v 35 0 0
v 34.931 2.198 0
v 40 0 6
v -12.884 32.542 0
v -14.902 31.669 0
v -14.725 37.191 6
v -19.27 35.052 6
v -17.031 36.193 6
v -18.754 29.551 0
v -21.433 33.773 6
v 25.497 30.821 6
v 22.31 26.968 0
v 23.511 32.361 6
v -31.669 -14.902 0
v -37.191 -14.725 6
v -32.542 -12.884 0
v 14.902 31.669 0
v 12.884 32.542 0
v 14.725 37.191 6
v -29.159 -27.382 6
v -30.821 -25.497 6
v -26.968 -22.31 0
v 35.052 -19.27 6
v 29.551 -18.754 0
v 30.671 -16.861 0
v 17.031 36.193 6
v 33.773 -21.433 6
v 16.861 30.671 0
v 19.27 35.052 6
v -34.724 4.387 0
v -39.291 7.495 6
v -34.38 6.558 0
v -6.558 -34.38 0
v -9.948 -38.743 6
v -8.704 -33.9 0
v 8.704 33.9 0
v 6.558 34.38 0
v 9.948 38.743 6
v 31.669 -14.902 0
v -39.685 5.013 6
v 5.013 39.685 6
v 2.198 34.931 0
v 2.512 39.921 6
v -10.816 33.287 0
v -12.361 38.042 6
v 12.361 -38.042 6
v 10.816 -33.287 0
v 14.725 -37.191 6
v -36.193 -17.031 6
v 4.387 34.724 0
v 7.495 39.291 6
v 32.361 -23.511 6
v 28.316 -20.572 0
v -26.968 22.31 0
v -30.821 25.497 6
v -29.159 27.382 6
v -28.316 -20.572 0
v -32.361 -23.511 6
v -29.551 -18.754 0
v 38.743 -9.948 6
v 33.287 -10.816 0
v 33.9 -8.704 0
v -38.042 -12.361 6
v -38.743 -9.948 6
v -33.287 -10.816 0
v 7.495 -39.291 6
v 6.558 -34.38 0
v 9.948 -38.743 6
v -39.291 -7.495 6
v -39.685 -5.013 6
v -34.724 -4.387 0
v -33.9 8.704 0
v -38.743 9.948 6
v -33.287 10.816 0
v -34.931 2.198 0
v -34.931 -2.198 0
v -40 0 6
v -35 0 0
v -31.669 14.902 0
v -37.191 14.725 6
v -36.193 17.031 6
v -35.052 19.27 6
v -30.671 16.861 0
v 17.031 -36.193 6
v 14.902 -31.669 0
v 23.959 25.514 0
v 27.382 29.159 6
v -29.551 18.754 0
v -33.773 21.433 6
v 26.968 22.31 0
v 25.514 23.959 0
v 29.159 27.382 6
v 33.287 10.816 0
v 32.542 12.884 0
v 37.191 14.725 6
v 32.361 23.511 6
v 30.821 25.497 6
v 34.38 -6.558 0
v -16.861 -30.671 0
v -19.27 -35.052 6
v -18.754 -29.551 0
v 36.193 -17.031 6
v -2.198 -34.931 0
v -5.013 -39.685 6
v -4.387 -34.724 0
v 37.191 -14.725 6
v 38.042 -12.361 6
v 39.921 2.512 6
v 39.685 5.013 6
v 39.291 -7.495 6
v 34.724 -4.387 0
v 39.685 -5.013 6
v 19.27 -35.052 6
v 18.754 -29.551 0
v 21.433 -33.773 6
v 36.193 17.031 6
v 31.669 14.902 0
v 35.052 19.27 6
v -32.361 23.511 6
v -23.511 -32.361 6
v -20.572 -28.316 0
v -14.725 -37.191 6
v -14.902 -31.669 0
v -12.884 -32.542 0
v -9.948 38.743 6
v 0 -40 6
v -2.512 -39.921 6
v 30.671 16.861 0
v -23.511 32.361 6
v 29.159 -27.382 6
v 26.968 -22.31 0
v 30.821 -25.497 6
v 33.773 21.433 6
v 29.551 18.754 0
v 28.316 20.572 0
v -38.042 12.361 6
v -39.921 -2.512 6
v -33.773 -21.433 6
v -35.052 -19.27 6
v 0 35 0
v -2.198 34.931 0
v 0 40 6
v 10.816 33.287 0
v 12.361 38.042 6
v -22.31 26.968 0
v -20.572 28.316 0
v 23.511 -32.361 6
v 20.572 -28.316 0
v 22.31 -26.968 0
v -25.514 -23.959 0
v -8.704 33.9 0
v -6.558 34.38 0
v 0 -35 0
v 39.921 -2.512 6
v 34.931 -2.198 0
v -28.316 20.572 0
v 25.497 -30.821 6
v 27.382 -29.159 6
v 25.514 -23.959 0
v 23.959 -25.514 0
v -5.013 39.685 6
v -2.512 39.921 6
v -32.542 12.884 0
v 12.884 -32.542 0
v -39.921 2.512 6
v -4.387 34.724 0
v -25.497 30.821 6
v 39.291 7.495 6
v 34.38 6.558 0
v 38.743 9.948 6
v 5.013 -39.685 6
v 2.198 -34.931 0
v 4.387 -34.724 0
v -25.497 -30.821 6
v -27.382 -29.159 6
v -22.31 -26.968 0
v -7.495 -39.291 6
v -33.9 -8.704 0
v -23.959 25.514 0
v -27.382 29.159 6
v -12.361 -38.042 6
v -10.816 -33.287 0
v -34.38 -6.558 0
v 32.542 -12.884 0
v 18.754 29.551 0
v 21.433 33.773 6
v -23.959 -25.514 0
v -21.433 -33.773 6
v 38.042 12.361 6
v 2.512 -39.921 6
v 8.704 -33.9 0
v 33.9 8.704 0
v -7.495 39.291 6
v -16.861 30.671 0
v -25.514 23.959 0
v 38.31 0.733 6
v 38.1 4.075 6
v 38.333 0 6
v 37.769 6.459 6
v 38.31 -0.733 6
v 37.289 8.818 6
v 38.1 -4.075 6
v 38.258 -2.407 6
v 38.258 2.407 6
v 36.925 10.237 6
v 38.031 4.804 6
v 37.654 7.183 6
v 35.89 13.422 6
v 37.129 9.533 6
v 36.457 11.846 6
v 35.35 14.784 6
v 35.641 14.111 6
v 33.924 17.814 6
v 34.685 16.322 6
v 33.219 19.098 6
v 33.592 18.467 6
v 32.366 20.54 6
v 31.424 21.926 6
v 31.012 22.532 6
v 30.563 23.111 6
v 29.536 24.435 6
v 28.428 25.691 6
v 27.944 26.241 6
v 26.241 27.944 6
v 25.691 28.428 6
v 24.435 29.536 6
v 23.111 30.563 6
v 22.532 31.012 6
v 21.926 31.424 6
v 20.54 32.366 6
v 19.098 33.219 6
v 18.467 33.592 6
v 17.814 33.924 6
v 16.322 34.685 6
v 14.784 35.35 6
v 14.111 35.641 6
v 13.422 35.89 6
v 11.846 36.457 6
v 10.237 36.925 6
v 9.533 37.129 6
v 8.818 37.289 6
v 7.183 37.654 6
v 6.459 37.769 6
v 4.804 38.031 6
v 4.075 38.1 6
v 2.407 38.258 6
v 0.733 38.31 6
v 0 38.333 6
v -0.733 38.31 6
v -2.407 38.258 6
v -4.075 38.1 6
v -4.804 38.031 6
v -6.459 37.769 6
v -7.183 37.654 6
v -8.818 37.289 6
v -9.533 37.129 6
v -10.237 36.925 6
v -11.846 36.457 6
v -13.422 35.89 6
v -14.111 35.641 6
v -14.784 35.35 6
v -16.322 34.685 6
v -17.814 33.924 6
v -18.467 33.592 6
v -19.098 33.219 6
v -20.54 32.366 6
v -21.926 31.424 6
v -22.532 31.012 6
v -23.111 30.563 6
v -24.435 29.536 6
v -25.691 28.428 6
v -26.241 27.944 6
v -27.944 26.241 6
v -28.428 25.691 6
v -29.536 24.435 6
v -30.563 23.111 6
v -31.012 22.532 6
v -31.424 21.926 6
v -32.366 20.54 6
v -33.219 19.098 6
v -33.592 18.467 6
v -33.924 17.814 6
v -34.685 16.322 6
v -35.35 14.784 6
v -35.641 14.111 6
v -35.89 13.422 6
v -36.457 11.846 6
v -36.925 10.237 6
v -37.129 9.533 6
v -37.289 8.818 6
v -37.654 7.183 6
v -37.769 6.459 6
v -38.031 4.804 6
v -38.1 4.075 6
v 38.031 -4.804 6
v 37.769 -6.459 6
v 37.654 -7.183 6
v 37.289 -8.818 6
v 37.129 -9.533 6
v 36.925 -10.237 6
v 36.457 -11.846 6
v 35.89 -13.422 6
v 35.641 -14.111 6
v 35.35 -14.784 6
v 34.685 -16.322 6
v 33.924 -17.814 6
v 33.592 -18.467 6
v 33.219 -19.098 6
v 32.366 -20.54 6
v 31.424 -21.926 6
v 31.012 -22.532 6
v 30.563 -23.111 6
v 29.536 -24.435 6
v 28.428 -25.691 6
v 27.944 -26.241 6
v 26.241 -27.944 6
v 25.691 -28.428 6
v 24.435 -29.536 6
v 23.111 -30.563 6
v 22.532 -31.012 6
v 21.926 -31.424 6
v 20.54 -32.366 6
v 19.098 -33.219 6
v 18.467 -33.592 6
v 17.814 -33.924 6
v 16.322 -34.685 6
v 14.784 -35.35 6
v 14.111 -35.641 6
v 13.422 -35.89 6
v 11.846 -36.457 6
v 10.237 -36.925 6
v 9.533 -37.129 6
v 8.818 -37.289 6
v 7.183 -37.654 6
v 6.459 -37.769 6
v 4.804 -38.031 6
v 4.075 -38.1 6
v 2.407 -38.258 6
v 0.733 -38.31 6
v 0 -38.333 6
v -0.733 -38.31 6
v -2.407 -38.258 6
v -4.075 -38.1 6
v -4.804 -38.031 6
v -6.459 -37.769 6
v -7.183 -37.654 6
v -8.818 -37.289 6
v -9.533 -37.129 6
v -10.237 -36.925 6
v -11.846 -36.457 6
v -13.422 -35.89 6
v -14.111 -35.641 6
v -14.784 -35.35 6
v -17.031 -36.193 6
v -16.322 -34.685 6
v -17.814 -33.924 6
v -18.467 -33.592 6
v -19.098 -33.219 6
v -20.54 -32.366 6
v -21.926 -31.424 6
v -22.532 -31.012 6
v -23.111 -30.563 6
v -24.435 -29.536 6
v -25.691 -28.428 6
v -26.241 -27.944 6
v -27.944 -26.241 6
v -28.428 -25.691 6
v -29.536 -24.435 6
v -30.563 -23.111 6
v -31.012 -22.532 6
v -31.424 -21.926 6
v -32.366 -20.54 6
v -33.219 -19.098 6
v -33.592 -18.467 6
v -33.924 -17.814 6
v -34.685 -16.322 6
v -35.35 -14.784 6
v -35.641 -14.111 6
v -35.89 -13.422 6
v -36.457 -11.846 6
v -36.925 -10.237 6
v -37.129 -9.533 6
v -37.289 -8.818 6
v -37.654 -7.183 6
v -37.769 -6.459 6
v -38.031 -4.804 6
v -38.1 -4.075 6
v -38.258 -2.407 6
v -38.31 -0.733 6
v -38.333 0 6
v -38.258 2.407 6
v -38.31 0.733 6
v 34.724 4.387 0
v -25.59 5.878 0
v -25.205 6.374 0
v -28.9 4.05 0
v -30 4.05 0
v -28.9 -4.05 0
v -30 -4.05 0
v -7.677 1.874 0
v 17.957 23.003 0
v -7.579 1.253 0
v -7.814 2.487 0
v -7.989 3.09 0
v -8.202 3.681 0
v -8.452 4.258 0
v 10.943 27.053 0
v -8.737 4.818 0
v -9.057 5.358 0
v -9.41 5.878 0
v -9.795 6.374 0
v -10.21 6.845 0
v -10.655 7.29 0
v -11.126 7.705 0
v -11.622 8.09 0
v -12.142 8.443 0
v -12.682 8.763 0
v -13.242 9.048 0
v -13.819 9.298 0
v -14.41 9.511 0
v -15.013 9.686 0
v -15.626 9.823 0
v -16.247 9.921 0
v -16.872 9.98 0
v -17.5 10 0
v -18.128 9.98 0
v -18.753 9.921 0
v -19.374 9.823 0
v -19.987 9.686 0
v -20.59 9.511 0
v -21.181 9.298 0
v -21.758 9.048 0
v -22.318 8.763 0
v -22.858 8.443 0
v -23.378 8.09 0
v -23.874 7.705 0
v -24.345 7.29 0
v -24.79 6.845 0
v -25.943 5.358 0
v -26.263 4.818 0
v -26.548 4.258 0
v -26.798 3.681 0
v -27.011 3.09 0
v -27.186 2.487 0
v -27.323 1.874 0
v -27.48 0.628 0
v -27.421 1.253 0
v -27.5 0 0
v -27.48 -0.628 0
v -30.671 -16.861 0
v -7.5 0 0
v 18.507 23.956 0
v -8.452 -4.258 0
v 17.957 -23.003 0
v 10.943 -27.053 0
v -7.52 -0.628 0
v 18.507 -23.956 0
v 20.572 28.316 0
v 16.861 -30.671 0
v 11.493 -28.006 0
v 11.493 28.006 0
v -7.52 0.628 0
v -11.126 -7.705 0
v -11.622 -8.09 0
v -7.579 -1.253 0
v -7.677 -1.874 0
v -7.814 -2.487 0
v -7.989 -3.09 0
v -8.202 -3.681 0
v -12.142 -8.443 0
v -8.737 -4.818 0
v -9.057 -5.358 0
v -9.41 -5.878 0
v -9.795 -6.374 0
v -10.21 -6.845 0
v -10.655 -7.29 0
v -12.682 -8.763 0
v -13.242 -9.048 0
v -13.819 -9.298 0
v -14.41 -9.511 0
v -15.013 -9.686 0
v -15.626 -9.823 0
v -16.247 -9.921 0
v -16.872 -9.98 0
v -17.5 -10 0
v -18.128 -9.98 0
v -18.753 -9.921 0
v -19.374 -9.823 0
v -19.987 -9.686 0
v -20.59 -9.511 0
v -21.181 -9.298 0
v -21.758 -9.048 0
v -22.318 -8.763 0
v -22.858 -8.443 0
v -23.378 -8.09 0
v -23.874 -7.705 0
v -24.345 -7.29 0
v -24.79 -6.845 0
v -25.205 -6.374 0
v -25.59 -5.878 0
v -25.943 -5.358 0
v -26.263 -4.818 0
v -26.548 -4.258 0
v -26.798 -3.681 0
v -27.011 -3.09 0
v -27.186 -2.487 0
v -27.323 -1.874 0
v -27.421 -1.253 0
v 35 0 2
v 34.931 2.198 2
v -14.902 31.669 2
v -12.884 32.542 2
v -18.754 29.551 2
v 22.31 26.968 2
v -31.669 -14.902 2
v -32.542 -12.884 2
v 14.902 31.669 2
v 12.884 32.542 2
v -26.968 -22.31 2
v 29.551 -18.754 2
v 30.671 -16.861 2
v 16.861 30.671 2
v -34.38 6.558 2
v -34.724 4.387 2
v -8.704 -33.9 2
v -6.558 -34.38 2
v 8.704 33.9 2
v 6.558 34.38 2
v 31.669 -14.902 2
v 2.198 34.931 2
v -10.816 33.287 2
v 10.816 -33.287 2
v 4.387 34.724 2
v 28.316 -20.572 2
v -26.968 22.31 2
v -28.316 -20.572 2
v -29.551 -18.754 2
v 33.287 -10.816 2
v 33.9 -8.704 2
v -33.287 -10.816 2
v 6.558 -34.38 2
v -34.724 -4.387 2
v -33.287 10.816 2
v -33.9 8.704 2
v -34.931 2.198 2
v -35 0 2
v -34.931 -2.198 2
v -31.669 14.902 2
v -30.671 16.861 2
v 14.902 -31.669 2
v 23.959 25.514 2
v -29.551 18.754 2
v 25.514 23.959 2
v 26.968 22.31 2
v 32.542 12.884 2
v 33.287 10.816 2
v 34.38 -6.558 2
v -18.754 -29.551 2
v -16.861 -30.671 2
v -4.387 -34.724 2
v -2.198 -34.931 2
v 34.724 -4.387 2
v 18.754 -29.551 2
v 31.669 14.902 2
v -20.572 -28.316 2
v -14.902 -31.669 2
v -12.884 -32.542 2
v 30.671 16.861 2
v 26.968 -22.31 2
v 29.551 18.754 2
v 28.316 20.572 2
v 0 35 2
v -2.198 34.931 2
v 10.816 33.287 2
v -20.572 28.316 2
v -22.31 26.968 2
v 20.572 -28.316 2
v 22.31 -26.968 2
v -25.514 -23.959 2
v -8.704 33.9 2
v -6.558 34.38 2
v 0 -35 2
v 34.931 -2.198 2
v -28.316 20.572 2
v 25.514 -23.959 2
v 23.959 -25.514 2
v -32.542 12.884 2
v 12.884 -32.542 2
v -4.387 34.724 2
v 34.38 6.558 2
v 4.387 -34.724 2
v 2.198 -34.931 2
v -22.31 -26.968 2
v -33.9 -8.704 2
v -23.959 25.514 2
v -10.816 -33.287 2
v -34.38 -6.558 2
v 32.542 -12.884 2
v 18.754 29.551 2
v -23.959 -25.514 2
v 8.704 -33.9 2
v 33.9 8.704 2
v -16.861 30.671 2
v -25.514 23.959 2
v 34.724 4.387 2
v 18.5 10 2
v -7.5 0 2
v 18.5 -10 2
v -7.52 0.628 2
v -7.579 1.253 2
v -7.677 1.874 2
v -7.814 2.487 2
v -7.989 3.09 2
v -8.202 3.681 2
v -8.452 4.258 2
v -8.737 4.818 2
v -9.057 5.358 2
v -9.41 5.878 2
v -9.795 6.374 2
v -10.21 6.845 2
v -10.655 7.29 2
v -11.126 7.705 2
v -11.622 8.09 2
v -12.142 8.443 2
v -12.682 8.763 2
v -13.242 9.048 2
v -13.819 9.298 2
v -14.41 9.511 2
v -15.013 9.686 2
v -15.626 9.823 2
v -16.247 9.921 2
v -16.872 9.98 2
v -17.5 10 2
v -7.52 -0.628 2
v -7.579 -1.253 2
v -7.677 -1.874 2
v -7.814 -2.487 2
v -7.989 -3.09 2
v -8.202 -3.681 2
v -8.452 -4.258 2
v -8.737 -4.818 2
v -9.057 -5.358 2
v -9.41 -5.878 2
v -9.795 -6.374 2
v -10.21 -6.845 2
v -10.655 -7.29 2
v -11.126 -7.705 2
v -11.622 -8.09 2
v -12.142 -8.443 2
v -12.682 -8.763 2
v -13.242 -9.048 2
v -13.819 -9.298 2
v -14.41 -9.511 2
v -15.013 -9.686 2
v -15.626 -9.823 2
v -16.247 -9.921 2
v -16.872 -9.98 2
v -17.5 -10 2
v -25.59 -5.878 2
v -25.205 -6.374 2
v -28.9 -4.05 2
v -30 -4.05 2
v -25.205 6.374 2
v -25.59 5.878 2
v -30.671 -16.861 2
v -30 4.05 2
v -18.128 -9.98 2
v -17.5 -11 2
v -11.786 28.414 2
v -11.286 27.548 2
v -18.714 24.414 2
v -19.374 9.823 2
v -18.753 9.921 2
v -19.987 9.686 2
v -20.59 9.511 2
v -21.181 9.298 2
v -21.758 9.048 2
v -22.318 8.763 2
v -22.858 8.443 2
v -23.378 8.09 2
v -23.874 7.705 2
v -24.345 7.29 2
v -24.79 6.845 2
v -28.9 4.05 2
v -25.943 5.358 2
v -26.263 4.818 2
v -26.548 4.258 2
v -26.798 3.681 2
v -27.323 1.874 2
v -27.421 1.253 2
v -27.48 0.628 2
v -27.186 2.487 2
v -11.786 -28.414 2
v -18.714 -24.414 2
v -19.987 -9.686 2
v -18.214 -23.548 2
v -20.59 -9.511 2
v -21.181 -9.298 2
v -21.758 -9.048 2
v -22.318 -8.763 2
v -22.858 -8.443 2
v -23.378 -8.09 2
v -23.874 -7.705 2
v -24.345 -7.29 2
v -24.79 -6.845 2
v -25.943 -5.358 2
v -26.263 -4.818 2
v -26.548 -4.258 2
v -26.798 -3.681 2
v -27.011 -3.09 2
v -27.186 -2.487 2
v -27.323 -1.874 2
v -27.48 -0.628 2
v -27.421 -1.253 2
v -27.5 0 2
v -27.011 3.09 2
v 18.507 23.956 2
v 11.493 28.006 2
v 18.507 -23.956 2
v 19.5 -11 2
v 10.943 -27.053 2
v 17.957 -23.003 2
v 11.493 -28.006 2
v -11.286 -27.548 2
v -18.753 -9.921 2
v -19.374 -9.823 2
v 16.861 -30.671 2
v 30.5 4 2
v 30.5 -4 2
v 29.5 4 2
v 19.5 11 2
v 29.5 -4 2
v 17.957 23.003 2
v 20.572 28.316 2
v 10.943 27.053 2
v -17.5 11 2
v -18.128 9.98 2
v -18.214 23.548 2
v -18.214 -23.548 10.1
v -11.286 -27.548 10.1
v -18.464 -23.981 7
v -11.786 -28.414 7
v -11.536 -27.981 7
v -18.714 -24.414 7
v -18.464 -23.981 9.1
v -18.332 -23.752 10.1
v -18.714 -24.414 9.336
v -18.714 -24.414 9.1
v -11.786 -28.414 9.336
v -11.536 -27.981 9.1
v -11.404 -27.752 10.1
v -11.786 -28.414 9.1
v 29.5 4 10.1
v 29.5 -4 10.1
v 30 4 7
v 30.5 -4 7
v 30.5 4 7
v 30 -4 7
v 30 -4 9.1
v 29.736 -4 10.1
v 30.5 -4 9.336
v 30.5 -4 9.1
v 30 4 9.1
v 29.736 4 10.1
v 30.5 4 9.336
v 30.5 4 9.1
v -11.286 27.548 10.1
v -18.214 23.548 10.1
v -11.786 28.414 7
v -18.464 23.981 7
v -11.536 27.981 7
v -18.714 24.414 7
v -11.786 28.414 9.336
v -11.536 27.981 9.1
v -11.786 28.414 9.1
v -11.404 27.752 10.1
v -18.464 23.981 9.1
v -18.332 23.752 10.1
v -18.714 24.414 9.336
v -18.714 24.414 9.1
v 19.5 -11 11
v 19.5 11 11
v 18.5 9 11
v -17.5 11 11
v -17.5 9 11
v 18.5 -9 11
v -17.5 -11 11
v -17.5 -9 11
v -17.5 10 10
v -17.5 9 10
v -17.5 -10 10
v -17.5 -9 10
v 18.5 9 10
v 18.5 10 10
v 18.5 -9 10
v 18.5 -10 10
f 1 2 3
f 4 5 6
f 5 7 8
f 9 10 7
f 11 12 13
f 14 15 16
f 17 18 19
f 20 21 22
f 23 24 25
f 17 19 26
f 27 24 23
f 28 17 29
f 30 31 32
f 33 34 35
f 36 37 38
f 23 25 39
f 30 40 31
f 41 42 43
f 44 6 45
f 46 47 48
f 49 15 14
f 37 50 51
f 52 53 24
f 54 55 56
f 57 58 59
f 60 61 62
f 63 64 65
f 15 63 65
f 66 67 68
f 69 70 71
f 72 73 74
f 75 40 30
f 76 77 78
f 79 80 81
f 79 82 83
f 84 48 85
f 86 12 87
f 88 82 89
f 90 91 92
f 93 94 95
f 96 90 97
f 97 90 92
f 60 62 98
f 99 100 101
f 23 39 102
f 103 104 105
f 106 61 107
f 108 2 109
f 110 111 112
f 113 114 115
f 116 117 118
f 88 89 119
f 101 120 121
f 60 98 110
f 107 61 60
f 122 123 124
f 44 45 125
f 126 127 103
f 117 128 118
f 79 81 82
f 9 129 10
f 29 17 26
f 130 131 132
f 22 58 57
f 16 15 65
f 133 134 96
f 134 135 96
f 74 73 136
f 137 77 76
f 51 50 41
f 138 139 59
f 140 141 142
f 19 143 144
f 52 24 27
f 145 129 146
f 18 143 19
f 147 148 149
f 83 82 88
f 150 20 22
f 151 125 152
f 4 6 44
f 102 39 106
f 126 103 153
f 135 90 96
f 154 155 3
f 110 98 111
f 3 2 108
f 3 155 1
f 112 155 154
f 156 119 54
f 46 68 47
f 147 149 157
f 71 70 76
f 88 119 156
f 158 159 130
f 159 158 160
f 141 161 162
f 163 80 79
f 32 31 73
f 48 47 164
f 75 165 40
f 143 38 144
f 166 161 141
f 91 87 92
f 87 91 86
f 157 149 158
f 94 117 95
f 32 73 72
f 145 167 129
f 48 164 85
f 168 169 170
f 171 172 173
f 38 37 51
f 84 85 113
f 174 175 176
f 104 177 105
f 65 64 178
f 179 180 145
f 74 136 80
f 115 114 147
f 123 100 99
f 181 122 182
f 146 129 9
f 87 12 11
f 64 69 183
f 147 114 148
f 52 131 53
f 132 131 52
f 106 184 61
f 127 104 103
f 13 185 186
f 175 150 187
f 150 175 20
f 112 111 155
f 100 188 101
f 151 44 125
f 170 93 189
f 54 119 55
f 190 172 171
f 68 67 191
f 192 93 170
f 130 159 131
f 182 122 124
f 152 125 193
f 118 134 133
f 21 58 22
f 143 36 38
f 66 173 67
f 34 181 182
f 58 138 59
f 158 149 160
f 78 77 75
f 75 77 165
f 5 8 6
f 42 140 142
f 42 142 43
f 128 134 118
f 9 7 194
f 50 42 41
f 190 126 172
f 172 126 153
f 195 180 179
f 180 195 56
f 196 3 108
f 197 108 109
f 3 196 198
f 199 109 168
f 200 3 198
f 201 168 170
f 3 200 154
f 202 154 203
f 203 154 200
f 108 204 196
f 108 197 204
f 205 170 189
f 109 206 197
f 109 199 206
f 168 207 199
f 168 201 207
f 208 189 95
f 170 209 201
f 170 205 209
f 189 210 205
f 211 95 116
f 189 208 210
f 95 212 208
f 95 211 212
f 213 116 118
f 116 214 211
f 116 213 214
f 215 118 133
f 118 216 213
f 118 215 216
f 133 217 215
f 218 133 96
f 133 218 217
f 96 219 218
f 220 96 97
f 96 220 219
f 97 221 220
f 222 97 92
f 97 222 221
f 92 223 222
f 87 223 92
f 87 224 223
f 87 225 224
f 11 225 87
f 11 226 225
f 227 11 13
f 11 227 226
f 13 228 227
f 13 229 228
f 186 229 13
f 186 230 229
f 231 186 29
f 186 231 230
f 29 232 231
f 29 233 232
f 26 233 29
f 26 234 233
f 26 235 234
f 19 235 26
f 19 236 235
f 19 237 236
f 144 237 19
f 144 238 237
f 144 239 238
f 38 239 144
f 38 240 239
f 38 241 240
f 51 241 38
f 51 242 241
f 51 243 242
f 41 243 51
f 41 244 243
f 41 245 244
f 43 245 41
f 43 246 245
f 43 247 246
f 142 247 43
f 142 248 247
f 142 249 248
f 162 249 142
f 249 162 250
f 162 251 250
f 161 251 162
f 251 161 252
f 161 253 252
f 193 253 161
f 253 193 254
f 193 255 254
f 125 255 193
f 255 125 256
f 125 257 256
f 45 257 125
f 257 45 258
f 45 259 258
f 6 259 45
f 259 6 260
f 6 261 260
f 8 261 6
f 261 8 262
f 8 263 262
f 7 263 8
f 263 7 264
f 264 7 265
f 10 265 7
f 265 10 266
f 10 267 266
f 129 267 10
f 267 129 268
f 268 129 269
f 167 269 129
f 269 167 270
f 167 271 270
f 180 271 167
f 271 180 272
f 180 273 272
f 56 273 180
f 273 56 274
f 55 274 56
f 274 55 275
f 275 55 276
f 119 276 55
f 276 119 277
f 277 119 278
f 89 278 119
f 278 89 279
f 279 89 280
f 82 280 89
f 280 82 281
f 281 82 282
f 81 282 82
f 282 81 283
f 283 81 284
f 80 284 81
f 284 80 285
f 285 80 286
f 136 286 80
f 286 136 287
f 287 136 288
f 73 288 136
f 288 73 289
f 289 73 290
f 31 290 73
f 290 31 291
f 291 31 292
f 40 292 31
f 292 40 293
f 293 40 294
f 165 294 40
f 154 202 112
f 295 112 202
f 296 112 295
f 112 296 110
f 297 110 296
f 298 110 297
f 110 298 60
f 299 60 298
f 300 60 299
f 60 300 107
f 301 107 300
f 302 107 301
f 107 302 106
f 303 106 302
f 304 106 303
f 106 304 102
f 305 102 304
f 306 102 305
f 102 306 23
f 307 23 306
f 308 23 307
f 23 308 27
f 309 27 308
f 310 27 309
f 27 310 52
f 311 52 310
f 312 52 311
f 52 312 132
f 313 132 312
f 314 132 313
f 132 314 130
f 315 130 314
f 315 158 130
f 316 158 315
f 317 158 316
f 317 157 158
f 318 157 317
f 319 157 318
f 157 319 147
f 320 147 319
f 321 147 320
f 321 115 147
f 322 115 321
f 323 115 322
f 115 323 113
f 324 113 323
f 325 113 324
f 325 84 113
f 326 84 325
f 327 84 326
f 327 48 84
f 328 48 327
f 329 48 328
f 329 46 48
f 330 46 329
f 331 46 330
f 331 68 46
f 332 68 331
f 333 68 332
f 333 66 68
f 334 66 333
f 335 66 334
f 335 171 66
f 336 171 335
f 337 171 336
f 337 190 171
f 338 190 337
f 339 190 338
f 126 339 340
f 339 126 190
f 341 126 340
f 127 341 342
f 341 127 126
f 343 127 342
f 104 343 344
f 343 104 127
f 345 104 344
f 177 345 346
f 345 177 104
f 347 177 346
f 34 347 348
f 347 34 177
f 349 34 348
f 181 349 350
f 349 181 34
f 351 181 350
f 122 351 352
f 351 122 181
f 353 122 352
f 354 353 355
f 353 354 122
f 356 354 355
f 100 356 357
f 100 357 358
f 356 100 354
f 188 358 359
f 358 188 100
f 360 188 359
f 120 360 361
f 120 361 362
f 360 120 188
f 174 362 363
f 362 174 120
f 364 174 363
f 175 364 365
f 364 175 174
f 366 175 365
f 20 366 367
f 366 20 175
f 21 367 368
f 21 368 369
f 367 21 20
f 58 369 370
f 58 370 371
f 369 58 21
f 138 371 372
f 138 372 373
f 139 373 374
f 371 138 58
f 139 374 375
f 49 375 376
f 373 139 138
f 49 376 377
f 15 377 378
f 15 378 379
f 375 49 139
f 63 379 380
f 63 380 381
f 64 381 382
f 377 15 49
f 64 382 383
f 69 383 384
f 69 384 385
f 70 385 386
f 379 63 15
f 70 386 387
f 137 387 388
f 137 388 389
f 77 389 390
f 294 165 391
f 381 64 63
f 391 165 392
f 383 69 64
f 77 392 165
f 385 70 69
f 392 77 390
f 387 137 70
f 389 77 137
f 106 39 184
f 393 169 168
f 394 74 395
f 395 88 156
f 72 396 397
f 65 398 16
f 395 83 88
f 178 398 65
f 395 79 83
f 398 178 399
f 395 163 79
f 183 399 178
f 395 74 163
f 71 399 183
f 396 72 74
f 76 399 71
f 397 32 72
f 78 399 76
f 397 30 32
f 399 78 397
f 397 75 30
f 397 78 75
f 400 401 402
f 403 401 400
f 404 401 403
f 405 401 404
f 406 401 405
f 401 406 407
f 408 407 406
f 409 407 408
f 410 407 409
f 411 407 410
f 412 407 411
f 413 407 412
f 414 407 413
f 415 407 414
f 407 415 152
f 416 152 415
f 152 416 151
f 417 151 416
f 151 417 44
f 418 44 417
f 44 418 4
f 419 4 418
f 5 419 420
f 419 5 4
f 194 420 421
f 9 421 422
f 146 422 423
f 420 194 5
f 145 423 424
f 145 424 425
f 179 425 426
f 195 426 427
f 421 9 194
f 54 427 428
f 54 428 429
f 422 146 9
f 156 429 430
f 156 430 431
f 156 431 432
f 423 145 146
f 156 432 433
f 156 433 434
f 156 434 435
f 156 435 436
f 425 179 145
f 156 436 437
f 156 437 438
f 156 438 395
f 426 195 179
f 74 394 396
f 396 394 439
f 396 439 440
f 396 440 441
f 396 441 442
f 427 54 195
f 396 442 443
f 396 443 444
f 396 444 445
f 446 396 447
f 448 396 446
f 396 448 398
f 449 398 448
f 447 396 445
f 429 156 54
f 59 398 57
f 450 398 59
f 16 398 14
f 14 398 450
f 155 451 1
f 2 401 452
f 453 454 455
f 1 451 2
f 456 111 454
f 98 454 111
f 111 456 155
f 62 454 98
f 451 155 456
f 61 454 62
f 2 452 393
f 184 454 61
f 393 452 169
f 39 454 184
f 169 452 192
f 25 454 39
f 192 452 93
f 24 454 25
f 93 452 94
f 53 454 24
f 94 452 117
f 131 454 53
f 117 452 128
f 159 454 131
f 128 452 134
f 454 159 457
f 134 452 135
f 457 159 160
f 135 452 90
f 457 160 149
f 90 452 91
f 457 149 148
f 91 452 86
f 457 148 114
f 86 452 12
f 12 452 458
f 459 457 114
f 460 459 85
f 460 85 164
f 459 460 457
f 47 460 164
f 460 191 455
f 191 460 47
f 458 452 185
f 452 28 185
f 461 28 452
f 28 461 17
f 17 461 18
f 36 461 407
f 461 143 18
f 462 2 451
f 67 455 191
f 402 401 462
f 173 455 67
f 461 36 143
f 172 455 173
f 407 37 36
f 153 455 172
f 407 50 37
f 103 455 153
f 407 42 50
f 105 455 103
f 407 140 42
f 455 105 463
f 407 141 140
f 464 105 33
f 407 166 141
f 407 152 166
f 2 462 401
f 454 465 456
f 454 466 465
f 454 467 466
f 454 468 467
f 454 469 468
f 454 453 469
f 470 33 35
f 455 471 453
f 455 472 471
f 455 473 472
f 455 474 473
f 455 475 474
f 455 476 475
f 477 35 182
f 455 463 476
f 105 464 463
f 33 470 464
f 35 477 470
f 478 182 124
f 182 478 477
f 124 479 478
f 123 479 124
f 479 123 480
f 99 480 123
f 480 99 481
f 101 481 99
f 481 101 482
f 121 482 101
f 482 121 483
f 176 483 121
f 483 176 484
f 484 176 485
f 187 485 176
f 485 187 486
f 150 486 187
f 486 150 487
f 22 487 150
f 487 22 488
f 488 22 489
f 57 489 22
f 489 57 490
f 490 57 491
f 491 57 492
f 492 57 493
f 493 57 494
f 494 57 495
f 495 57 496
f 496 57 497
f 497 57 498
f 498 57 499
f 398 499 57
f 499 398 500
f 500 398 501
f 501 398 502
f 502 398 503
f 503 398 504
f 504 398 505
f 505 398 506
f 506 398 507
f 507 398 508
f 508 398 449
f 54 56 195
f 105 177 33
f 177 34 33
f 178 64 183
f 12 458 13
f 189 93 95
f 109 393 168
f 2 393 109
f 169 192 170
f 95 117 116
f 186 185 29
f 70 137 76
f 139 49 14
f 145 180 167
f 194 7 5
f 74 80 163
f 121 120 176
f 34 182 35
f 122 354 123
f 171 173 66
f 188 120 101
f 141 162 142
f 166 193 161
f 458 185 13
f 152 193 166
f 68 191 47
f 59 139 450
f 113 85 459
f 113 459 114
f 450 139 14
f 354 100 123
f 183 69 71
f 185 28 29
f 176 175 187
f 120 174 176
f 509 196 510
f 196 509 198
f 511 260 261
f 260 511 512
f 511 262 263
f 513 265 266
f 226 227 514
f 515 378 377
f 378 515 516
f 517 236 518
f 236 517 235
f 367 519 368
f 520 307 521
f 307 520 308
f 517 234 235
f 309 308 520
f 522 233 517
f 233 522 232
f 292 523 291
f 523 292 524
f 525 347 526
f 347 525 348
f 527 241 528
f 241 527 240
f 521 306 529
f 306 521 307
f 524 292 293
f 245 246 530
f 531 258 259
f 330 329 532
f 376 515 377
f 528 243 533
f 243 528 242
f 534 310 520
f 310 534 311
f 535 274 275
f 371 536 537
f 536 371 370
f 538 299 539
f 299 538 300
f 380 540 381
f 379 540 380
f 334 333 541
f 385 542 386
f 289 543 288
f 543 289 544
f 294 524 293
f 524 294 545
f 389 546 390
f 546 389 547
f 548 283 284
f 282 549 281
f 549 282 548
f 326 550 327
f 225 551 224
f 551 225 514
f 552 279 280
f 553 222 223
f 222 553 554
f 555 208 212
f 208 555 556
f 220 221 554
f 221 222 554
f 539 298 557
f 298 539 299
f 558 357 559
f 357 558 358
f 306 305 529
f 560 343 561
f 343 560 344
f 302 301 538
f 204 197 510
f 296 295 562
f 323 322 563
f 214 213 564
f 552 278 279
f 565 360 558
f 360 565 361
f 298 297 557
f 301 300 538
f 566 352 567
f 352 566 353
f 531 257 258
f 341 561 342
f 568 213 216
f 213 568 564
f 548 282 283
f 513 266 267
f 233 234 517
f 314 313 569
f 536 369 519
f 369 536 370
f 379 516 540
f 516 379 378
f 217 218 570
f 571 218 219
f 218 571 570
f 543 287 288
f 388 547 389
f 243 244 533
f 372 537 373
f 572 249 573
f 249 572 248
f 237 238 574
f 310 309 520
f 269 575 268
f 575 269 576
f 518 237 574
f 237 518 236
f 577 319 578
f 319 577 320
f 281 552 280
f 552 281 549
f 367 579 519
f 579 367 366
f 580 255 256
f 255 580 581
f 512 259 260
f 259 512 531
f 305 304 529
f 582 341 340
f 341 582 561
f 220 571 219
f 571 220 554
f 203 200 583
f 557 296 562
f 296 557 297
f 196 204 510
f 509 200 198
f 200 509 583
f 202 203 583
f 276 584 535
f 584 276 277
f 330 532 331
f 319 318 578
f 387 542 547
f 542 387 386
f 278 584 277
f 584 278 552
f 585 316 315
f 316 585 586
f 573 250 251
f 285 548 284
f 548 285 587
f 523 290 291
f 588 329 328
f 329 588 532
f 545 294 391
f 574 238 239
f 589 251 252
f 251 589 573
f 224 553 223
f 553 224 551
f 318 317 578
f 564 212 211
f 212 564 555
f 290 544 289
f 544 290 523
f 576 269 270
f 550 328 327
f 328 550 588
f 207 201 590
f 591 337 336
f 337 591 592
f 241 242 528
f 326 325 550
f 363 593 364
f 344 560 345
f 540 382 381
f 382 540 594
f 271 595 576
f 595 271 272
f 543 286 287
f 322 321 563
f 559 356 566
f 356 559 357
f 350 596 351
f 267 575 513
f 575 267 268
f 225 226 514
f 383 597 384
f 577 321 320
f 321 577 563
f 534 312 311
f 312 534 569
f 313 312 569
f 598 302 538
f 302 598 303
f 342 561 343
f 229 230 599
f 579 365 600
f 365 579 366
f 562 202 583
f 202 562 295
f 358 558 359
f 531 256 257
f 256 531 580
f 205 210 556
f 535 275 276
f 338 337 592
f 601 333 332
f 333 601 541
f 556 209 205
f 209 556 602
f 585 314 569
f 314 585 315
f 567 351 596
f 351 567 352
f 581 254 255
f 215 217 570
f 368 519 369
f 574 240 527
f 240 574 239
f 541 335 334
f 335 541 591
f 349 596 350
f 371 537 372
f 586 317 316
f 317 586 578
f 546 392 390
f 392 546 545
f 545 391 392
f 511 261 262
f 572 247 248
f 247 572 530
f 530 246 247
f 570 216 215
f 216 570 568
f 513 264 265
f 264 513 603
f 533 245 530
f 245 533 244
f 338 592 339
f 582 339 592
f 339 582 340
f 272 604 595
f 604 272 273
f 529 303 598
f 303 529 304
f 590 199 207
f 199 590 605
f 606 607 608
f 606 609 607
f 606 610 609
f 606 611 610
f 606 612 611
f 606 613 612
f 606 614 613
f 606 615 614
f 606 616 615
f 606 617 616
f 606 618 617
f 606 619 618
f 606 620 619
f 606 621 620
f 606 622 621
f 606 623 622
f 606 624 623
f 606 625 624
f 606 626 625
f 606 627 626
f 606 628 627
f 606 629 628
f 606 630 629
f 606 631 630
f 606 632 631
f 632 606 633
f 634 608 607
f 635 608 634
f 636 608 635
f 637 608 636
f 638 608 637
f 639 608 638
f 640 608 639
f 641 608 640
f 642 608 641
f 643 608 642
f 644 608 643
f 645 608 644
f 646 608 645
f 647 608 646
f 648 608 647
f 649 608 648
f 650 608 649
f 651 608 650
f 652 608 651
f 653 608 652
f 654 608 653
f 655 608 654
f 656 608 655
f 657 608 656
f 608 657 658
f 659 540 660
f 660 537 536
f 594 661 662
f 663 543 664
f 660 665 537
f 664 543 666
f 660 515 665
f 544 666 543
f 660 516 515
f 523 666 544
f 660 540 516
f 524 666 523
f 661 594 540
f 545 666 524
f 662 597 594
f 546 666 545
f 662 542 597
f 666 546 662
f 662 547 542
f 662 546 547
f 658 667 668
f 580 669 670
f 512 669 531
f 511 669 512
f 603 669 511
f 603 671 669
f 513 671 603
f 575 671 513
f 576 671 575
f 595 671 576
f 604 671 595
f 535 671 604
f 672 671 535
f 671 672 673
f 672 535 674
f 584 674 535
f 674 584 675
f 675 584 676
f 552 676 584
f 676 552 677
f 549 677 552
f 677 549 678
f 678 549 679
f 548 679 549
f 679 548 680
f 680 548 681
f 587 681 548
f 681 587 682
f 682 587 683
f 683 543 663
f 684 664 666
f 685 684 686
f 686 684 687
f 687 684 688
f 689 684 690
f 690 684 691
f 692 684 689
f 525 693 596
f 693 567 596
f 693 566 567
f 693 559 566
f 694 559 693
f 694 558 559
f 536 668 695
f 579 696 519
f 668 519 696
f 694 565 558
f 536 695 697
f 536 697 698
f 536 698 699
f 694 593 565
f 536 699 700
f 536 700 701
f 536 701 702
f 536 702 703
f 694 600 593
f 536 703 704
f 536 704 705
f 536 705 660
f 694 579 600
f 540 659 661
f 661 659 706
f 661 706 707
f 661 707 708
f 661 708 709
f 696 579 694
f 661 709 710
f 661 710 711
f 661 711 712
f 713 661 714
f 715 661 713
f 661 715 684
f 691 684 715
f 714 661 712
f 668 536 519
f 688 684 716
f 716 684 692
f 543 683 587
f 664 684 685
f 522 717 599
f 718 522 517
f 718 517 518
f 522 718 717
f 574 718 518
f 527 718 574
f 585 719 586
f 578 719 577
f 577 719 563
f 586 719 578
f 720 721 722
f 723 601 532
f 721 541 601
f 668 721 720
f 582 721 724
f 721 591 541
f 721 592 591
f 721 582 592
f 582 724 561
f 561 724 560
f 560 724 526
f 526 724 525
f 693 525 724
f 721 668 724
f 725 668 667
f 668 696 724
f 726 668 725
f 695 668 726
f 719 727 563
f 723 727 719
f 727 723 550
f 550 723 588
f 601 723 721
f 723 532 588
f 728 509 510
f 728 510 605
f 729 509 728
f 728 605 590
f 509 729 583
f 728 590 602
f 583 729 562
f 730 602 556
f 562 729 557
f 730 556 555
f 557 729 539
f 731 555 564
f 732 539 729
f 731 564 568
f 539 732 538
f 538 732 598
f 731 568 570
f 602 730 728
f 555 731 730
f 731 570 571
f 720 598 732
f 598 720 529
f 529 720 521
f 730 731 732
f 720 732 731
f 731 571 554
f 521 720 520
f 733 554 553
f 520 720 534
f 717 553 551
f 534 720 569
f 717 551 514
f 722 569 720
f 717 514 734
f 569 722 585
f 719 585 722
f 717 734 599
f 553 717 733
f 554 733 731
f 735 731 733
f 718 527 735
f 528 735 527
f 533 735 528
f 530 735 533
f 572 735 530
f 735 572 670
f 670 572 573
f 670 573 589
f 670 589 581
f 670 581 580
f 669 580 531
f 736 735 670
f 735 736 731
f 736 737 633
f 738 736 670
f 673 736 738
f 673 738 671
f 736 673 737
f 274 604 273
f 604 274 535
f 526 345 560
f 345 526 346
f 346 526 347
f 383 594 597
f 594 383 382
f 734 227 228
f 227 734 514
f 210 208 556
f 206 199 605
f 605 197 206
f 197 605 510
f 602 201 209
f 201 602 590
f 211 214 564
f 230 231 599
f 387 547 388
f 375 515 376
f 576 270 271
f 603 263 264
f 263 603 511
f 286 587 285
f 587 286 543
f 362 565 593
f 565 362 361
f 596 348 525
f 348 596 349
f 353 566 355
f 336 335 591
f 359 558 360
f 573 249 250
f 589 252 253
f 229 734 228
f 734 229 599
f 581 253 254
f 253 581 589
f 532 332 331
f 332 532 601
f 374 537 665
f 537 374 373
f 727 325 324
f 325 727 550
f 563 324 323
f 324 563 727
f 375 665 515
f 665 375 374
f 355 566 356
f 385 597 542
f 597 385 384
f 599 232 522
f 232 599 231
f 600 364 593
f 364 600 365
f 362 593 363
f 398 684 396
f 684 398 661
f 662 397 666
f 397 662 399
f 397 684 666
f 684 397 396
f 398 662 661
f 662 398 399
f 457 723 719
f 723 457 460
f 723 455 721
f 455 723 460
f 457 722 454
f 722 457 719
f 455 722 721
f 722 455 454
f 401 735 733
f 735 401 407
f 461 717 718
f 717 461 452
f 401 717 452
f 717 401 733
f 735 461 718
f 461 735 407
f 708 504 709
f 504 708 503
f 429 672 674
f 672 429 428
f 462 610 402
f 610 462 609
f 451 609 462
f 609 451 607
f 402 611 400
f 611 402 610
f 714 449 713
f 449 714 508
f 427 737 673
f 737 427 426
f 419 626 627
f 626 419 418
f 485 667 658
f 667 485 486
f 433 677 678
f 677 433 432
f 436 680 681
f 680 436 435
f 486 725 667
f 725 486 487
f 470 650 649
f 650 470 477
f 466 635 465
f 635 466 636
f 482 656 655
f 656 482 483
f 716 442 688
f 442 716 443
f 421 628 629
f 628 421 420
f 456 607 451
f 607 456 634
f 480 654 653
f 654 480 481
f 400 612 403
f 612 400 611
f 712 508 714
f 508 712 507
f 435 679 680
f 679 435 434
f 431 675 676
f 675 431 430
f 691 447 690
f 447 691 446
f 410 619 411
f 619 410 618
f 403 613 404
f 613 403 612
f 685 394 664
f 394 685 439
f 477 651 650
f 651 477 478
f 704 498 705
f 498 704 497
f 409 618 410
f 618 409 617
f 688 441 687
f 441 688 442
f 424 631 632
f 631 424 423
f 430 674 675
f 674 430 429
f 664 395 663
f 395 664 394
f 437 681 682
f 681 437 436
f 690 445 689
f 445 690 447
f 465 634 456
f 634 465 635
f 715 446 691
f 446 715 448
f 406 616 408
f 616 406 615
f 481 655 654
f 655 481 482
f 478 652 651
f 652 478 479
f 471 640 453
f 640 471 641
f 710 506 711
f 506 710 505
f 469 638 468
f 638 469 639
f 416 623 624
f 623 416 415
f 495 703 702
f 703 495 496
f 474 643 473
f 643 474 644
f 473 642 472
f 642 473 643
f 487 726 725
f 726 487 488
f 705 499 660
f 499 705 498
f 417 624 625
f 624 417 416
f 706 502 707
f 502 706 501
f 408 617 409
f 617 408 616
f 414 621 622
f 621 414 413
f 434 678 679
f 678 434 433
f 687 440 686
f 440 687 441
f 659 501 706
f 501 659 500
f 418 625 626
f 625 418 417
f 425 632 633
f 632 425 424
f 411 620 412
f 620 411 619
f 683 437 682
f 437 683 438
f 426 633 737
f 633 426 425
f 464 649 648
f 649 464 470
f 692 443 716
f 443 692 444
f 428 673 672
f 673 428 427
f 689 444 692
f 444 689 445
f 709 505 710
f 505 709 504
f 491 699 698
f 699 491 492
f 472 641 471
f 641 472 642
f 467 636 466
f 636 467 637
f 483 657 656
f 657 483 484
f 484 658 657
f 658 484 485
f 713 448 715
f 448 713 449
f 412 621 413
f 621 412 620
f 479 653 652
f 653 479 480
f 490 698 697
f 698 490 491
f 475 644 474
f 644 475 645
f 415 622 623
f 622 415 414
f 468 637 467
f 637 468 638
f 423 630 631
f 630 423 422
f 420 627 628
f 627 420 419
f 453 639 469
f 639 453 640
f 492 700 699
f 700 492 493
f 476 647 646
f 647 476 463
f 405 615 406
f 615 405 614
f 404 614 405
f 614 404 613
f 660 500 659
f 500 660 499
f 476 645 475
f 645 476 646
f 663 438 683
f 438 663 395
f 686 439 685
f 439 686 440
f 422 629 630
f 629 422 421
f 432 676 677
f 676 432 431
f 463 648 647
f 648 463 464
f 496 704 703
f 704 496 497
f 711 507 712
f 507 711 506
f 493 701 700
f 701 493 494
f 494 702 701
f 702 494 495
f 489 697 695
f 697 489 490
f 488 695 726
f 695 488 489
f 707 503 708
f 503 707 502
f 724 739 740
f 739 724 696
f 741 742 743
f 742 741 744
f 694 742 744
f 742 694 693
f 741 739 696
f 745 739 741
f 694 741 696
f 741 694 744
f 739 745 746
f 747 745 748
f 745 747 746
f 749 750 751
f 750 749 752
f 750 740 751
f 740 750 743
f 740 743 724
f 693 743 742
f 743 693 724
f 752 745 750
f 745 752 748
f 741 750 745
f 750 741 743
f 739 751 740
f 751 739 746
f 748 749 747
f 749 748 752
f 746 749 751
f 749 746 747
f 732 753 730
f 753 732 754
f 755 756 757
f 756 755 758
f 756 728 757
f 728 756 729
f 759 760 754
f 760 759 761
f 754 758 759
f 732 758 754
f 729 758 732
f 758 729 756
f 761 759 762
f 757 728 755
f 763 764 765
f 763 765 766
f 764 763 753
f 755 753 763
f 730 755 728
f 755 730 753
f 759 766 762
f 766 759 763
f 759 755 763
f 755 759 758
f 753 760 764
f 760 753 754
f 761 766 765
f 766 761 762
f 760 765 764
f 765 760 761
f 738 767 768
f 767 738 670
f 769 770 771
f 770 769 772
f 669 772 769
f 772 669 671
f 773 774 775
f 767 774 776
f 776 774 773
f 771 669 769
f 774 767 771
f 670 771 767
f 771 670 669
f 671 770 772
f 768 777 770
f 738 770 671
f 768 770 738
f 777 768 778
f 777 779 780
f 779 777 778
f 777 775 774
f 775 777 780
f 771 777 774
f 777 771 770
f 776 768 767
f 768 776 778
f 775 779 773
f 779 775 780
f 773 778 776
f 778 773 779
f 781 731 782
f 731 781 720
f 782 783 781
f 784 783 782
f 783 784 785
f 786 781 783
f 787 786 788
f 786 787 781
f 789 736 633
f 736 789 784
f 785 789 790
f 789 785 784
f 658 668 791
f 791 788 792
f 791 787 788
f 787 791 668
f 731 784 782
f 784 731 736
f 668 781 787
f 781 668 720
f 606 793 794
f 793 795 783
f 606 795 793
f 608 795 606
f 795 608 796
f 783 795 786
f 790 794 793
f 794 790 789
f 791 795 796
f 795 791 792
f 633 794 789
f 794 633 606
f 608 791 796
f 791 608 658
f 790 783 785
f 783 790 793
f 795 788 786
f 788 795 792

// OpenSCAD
// file: housing.scad
width  = 22.5;
length = 29.0;
height =  1.6;

p_width  = width  + 0.25;
p_length = length + 0.25;
p_height = height + 0.15;

b_width  = width  + 2;
b_length = length;

module disc()
{
    difference()
    {
        cylinder(h=6, r1=35, r2=40, center=false, $fn=100);
        translate([0, 0, 2])
        {
            cylinder(h=6, r1=35, r2=40, center=false, $fn=100);
        }
    }
}

module supports()
{
    for(i=[0:120:360])
    {
        rotate([0, 0, i])
        {
            translate([30, 0, 2])
            {
                difference()
                {
                    cylinder(h=5, r=4, $fn=100);
                    cylinder(h=5, r=1.3, $fn=100);
                }
            }
        }
    }
}

module clippers(w=8)
{
    for(i=[60:120:360]) rotate([0, 0, i]) translate([-30, 0, 0])
    {
        translate([-0.5, -w/2, 2])
            difference()
            {
                union()
                {
                    translate([0, 0, 0]) cube([1, w, 5]);
                    translate([0.5, 0, 5]) cube([0.5, w, 2.1]);
                    translate([0, 0, 7.1]) cube([1, w, 1]);
                }
                translate([-1, 0, 7.75]) rotate([0, 45, 0]) cube([1, w, 2]);
            }
    }
}

module clipping_holes(w=8)
{
    for(i=[0:120:360]) rotate([0, 0, i])
    {
        translate([-30, 0, 0])
        {
            translate([0, -(w + 0.1)/2, 0]) cube([1.1, w + 0.1, 2.1]);
        }
    }
}

module pcb_support()
{
    difference()
    {
        translate([-(b_length)/2+1, -b_width/2, 2]) cube([b_length, b_width, 8]);
        translate([-p_length/2, -p_width/2, 5.5 + p_height])
            cube([p_length, p_width, p_height]);
        translate([-p_length/2, -(width - 1.0)/2, 2]) cube([p_length, width - 1.0, 10]);
        translate([-p_length/2, -p_width/2+1, 5.5 + p_height])
            cube([p_length-13.5, p_width+2, p_height+2]);
        translate([-p_length/2 + 1, -(width-1)/2, 9]) cube([p_length, width - 1.0, 2]);
    }

    translate([-length/2-2, width/2-1,2]) cube([2, 1, 8]);

}

module pcb()
{
    translate([-length/2, -width/2, 5.5 + height]) cube([length, width, height]);
}

module battery_support()
{
    difference()
    {
        translate([-35/2, -22/2, 2]) cube([37,22,9]);
        translate([-37/2, -20/2, 2]) cube([37,20, 8]);
        translate([-37/2, -18/2, 2]) cube([37,18,10]);
    }
}

module cable_hole()
{
    translate([-17.5, 0, 0])
    {
        cylinder(h=6, r1=10, r2=10, center=false, $fn=100);
    }
}

module solar_panel(l=37.5, w=22.5)
{
    union()
    {
        translate([-(l+0.1)/2, -(w+0.1)/2, 1]) cube([l+0.1, w+0.1, 2]);
        translate([-(l-1)/2, -(w-1)/2, 0]) cube([l-1, w-1, 1]);
    }
}
// main file
use <housing.scad>

union()
{
    difference()
    {
        disc();
        cable_hole();
        clipping_holes();
    }
    clippers();
    
    battery_support();
}
